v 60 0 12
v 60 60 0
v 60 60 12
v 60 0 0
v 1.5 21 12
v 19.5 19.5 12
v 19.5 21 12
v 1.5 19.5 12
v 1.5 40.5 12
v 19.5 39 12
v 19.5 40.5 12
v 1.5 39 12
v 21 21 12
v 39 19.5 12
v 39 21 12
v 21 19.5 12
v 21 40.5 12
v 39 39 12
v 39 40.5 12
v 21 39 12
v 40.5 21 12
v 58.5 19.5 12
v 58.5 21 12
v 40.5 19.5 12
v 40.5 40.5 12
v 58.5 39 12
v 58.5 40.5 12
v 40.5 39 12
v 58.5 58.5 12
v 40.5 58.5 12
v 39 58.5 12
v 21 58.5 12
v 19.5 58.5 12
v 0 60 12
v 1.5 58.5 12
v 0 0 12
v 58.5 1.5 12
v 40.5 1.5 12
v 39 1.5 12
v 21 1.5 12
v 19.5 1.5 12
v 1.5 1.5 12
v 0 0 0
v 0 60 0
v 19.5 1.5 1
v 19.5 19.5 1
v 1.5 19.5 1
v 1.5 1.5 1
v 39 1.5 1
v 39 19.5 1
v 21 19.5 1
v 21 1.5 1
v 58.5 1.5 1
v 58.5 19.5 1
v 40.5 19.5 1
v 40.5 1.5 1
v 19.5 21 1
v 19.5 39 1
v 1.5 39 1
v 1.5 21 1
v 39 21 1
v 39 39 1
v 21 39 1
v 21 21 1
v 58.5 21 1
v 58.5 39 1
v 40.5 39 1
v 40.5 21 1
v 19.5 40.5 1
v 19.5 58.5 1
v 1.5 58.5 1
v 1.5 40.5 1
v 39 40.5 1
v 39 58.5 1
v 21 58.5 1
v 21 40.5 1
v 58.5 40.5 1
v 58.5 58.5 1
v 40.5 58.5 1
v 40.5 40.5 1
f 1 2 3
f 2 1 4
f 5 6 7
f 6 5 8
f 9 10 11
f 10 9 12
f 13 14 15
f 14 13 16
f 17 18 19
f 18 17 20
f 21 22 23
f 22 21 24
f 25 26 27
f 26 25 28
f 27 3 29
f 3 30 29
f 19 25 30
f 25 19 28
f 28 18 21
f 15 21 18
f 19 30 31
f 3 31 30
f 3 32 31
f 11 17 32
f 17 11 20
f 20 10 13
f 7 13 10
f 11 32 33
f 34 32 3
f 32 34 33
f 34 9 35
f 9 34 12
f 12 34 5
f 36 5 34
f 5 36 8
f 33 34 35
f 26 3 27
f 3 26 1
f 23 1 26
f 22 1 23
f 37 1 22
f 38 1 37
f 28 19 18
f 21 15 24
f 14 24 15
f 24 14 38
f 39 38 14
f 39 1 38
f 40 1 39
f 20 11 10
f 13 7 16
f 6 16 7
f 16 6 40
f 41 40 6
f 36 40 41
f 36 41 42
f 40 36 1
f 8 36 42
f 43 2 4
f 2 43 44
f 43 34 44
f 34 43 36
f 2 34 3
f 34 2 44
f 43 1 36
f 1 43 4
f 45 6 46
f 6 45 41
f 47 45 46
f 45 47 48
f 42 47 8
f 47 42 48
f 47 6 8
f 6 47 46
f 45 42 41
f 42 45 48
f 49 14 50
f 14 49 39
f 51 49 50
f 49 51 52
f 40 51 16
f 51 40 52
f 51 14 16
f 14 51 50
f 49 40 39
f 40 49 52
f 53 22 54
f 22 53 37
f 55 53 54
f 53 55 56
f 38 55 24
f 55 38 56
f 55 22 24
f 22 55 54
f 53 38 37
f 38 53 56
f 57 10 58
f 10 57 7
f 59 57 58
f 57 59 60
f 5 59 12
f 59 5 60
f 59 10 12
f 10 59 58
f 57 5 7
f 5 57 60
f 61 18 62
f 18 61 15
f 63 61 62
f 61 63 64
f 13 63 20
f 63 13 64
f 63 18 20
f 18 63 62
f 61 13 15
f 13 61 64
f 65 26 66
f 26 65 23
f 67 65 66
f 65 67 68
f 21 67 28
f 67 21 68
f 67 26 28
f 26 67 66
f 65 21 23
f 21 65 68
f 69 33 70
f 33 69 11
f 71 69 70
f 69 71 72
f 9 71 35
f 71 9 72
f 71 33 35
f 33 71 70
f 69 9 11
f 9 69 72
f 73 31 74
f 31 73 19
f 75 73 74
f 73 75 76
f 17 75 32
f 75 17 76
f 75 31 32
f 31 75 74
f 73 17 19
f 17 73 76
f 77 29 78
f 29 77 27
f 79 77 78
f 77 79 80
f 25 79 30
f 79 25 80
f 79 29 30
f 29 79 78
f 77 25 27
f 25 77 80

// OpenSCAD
bin_size=18;
wall_size=1.5;
height=12;
base=1;

cube_vector = [bin_size, bin_size, height-base];

difference() {
  cube([bin_size*3+wall_size*4, bin_size*3+wall_size*4, height]);
  translate([wall_size, wall_size, base]) cube(cube_vector);
  translate([wall_size*2+bin_size, wall_size, base]) cube(cube_vector);
  translate([wall_size*3+bin_size*2, wall_size, base]) cube(cube_vector);

  translate([wall_size*1+bin_size*0, wall_size*2+bin_size*1, base]) cube(cube_vector);
  translate([wall_size*2+bin_size*1, wall_size*2+bin_size*1, base]) cube(cube_vector);
  translate([wall_size*3+bin_size*2, wall_size*2+bin_size*1, base]) cube(cube_vector);

  translate([wall_size*1+bin_size*0, wall_size*3+bin_size*2, base]) cube(cube_vector);
  translate([wall_size*2+bin_size*1, wall_size*3+bin_size*2, base]) cube(cube_vector);
  translate([wall_size*3+bin_size*2, wall_size*3+bin_size*2, base]) cube(cube_vector);

}
